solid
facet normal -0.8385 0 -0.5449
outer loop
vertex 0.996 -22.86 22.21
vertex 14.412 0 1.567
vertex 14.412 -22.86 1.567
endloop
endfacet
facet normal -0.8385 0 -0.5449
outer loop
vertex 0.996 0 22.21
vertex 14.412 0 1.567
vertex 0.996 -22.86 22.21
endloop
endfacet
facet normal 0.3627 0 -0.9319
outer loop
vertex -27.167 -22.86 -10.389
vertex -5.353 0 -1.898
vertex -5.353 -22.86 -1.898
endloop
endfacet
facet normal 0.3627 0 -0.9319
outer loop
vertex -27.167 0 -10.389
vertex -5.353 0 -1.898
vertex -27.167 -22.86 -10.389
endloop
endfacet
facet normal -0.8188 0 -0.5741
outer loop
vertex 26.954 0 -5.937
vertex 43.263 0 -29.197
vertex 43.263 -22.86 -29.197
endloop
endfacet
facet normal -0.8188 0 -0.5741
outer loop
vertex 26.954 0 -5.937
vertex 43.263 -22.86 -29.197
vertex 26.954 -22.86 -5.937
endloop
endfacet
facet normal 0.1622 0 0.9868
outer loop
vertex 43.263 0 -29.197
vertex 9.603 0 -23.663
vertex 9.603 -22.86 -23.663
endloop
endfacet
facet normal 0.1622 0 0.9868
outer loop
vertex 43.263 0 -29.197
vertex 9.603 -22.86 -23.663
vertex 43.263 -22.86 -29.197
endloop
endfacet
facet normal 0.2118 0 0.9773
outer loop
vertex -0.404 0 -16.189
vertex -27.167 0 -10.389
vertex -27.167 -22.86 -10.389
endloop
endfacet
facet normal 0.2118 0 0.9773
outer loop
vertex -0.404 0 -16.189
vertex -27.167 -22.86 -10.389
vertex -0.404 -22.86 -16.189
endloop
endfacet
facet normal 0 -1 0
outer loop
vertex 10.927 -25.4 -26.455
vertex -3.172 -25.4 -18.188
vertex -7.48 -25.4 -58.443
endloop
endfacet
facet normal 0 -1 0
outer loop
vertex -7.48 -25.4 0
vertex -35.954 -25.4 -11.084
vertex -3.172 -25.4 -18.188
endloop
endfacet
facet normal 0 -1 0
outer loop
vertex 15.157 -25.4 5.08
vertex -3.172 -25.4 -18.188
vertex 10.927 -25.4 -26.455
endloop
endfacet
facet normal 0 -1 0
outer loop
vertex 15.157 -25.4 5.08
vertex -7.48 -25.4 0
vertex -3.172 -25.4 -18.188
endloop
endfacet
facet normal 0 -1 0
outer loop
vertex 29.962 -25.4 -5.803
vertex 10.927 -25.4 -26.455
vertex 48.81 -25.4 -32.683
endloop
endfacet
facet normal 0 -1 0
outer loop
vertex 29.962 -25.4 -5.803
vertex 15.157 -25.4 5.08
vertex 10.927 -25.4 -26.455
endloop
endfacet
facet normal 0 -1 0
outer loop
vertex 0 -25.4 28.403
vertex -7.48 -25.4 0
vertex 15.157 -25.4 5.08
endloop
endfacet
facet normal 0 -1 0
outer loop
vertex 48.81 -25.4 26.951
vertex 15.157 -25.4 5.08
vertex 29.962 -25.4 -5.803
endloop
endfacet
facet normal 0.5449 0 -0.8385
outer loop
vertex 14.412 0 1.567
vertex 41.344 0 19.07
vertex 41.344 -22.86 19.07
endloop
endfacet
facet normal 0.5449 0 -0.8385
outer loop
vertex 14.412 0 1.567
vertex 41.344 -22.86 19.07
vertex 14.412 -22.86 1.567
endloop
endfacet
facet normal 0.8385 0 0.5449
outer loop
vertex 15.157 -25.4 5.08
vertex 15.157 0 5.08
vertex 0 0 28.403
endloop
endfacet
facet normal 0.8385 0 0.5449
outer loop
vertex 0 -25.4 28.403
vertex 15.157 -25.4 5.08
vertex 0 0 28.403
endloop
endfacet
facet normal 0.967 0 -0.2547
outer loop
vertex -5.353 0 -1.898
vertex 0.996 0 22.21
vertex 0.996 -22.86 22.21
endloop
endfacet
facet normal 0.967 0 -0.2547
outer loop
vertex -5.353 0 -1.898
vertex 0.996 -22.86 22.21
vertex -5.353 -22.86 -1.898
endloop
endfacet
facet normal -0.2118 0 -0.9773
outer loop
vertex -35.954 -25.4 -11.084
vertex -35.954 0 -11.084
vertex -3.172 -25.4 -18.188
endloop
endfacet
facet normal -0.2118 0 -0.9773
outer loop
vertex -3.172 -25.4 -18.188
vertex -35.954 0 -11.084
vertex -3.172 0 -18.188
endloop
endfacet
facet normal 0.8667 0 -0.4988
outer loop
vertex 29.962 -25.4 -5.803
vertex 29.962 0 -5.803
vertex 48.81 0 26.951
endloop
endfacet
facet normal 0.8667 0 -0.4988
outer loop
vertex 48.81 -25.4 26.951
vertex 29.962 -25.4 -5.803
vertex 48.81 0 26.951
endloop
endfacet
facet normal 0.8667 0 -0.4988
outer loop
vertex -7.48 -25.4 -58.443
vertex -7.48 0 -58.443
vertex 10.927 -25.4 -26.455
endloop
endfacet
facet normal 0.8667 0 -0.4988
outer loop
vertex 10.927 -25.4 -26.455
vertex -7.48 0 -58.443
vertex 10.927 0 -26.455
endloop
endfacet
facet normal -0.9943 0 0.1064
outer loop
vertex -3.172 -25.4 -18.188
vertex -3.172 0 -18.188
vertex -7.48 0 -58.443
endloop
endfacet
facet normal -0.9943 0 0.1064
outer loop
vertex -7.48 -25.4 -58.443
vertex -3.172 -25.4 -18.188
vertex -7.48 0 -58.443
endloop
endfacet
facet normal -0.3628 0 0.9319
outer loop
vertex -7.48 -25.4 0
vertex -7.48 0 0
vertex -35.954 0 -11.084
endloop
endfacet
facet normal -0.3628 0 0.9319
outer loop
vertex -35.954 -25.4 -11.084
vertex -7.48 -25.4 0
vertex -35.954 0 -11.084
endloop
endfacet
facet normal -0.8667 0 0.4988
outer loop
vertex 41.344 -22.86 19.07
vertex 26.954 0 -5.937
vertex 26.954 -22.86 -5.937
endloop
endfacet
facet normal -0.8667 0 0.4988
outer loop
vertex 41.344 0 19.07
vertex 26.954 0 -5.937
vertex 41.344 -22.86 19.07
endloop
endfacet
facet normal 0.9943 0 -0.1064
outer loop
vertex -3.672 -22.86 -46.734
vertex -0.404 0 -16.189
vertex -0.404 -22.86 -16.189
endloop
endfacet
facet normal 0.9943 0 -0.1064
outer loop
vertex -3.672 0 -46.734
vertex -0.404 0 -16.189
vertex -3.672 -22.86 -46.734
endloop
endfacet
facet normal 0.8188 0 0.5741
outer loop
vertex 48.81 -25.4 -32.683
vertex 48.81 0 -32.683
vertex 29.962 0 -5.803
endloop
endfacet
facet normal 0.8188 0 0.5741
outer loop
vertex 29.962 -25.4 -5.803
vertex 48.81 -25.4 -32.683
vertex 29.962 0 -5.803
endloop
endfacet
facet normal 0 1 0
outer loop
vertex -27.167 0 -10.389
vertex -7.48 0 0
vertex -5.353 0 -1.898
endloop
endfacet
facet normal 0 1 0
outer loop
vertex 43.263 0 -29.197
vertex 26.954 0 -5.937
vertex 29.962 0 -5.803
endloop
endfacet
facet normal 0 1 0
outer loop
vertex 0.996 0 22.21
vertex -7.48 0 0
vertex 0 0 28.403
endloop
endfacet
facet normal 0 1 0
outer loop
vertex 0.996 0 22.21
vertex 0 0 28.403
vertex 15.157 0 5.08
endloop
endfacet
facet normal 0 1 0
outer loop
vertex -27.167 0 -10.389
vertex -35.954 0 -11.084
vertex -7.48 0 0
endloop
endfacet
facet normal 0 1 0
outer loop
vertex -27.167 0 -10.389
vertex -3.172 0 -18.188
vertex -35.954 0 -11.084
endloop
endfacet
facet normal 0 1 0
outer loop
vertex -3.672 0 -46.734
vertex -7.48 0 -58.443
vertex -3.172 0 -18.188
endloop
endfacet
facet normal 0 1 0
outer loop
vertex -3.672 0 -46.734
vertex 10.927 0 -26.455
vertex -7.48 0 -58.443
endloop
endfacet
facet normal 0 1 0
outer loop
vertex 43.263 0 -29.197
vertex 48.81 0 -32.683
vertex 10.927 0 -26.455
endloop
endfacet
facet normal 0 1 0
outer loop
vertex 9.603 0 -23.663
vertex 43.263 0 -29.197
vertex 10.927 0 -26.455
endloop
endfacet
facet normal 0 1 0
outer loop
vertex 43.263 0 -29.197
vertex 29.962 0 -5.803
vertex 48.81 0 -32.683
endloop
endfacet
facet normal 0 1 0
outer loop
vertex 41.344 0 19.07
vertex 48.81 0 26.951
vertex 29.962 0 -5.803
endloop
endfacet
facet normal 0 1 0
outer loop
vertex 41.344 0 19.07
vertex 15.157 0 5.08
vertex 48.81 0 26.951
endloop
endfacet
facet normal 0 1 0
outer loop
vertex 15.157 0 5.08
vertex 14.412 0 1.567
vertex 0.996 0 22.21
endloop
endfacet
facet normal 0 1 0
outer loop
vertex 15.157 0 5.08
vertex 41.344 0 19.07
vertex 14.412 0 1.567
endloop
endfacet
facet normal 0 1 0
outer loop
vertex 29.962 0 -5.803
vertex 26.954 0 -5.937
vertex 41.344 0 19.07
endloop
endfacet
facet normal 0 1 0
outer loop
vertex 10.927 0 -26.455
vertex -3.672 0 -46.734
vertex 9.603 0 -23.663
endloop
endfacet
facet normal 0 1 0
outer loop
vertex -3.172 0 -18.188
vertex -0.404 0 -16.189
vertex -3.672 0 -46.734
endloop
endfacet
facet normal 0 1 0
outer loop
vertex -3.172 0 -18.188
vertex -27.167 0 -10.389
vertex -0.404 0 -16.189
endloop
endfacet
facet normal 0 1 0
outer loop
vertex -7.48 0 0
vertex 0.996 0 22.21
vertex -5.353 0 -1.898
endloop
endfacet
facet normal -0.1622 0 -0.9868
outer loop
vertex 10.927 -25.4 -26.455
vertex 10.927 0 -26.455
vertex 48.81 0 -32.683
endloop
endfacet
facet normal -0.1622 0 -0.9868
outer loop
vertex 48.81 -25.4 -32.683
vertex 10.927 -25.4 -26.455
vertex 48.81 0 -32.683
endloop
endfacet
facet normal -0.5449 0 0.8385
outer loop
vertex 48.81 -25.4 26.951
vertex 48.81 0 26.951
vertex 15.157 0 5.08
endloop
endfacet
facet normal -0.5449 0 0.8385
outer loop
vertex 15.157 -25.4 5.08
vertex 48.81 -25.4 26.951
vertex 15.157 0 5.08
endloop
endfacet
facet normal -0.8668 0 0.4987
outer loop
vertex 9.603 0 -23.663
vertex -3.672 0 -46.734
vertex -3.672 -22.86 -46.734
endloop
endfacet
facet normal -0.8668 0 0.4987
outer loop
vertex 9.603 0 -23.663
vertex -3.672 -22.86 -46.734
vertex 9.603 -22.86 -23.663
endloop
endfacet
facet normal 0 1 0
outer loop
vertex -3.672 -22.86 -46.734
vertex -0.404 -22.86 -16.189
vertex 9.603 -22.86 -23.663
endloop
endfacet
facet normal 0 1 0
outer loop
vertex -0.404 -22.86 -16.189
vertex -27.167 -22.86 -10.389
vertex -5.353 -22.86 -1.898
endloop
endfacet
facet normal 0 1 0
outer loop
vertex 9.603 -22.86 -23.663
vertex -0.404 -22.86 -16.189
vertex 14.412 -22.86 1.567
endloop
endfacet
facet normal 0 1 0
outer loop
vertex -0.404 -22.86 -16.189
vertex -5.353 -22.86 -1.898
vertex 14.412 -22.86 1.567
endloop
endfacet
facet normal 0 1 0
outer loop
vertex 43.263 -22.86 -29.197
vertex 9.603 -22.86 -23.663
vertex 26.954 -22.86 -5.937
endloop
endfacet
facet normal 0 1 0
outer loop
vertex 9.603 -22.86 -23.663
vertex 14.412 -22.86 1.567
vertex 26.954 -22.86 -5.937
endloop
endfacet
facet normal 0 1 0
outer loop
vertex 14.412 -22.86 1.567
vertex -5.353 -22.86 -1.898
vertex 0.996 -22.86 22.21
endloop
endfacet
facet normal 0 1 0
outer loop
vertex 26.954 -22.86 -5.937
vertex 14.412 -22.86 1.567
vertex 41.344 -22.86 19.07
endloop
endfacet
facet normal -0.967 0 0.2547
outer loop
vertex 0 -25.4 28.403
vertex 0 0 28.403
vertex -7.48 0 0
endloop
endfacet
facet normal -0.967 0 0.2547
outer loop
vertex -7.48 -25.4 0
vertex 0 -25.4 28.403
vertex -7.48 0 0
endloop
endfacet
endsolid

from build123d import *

# Parameters (mm, degrees)
F1_DEPTH = 25.4
F2_T     = -2.54


with BuildPart() as f1:
    # F0 (on Front) → F1 (new body)
    with BuildSketch(Plane.XZ):
        Polygon((15.157177113, 5.0804899074), (0, 28.4029003233), (0, -45.4445231952), (10.9272608534, -26.454931125), (48.8096907386, -32.682903111), (29.9618504941, -5.8029429056), (48.8096907386, 26.9511756652), align=None)
        Polygon((0, -45.4445231952), (0, 28.4029003233), (-7.4798503051, 0), (-35.9542183578, -11.0840788111), (-3.1724292785, -18.1879308075), (-7.4798503051, -58.4431426979), align=None)
    extrude(amount=F1_DEPTH)

    # F2
    f2_openings = [f1.faces().sort_by_distance(p)[0] for p in [
        (11.533171, 0, -9.565851),
    ]]
    offset(amount=F2_T, openings=f2_openings, kind=Kind.INTERSECTION)


solid = f1.part
